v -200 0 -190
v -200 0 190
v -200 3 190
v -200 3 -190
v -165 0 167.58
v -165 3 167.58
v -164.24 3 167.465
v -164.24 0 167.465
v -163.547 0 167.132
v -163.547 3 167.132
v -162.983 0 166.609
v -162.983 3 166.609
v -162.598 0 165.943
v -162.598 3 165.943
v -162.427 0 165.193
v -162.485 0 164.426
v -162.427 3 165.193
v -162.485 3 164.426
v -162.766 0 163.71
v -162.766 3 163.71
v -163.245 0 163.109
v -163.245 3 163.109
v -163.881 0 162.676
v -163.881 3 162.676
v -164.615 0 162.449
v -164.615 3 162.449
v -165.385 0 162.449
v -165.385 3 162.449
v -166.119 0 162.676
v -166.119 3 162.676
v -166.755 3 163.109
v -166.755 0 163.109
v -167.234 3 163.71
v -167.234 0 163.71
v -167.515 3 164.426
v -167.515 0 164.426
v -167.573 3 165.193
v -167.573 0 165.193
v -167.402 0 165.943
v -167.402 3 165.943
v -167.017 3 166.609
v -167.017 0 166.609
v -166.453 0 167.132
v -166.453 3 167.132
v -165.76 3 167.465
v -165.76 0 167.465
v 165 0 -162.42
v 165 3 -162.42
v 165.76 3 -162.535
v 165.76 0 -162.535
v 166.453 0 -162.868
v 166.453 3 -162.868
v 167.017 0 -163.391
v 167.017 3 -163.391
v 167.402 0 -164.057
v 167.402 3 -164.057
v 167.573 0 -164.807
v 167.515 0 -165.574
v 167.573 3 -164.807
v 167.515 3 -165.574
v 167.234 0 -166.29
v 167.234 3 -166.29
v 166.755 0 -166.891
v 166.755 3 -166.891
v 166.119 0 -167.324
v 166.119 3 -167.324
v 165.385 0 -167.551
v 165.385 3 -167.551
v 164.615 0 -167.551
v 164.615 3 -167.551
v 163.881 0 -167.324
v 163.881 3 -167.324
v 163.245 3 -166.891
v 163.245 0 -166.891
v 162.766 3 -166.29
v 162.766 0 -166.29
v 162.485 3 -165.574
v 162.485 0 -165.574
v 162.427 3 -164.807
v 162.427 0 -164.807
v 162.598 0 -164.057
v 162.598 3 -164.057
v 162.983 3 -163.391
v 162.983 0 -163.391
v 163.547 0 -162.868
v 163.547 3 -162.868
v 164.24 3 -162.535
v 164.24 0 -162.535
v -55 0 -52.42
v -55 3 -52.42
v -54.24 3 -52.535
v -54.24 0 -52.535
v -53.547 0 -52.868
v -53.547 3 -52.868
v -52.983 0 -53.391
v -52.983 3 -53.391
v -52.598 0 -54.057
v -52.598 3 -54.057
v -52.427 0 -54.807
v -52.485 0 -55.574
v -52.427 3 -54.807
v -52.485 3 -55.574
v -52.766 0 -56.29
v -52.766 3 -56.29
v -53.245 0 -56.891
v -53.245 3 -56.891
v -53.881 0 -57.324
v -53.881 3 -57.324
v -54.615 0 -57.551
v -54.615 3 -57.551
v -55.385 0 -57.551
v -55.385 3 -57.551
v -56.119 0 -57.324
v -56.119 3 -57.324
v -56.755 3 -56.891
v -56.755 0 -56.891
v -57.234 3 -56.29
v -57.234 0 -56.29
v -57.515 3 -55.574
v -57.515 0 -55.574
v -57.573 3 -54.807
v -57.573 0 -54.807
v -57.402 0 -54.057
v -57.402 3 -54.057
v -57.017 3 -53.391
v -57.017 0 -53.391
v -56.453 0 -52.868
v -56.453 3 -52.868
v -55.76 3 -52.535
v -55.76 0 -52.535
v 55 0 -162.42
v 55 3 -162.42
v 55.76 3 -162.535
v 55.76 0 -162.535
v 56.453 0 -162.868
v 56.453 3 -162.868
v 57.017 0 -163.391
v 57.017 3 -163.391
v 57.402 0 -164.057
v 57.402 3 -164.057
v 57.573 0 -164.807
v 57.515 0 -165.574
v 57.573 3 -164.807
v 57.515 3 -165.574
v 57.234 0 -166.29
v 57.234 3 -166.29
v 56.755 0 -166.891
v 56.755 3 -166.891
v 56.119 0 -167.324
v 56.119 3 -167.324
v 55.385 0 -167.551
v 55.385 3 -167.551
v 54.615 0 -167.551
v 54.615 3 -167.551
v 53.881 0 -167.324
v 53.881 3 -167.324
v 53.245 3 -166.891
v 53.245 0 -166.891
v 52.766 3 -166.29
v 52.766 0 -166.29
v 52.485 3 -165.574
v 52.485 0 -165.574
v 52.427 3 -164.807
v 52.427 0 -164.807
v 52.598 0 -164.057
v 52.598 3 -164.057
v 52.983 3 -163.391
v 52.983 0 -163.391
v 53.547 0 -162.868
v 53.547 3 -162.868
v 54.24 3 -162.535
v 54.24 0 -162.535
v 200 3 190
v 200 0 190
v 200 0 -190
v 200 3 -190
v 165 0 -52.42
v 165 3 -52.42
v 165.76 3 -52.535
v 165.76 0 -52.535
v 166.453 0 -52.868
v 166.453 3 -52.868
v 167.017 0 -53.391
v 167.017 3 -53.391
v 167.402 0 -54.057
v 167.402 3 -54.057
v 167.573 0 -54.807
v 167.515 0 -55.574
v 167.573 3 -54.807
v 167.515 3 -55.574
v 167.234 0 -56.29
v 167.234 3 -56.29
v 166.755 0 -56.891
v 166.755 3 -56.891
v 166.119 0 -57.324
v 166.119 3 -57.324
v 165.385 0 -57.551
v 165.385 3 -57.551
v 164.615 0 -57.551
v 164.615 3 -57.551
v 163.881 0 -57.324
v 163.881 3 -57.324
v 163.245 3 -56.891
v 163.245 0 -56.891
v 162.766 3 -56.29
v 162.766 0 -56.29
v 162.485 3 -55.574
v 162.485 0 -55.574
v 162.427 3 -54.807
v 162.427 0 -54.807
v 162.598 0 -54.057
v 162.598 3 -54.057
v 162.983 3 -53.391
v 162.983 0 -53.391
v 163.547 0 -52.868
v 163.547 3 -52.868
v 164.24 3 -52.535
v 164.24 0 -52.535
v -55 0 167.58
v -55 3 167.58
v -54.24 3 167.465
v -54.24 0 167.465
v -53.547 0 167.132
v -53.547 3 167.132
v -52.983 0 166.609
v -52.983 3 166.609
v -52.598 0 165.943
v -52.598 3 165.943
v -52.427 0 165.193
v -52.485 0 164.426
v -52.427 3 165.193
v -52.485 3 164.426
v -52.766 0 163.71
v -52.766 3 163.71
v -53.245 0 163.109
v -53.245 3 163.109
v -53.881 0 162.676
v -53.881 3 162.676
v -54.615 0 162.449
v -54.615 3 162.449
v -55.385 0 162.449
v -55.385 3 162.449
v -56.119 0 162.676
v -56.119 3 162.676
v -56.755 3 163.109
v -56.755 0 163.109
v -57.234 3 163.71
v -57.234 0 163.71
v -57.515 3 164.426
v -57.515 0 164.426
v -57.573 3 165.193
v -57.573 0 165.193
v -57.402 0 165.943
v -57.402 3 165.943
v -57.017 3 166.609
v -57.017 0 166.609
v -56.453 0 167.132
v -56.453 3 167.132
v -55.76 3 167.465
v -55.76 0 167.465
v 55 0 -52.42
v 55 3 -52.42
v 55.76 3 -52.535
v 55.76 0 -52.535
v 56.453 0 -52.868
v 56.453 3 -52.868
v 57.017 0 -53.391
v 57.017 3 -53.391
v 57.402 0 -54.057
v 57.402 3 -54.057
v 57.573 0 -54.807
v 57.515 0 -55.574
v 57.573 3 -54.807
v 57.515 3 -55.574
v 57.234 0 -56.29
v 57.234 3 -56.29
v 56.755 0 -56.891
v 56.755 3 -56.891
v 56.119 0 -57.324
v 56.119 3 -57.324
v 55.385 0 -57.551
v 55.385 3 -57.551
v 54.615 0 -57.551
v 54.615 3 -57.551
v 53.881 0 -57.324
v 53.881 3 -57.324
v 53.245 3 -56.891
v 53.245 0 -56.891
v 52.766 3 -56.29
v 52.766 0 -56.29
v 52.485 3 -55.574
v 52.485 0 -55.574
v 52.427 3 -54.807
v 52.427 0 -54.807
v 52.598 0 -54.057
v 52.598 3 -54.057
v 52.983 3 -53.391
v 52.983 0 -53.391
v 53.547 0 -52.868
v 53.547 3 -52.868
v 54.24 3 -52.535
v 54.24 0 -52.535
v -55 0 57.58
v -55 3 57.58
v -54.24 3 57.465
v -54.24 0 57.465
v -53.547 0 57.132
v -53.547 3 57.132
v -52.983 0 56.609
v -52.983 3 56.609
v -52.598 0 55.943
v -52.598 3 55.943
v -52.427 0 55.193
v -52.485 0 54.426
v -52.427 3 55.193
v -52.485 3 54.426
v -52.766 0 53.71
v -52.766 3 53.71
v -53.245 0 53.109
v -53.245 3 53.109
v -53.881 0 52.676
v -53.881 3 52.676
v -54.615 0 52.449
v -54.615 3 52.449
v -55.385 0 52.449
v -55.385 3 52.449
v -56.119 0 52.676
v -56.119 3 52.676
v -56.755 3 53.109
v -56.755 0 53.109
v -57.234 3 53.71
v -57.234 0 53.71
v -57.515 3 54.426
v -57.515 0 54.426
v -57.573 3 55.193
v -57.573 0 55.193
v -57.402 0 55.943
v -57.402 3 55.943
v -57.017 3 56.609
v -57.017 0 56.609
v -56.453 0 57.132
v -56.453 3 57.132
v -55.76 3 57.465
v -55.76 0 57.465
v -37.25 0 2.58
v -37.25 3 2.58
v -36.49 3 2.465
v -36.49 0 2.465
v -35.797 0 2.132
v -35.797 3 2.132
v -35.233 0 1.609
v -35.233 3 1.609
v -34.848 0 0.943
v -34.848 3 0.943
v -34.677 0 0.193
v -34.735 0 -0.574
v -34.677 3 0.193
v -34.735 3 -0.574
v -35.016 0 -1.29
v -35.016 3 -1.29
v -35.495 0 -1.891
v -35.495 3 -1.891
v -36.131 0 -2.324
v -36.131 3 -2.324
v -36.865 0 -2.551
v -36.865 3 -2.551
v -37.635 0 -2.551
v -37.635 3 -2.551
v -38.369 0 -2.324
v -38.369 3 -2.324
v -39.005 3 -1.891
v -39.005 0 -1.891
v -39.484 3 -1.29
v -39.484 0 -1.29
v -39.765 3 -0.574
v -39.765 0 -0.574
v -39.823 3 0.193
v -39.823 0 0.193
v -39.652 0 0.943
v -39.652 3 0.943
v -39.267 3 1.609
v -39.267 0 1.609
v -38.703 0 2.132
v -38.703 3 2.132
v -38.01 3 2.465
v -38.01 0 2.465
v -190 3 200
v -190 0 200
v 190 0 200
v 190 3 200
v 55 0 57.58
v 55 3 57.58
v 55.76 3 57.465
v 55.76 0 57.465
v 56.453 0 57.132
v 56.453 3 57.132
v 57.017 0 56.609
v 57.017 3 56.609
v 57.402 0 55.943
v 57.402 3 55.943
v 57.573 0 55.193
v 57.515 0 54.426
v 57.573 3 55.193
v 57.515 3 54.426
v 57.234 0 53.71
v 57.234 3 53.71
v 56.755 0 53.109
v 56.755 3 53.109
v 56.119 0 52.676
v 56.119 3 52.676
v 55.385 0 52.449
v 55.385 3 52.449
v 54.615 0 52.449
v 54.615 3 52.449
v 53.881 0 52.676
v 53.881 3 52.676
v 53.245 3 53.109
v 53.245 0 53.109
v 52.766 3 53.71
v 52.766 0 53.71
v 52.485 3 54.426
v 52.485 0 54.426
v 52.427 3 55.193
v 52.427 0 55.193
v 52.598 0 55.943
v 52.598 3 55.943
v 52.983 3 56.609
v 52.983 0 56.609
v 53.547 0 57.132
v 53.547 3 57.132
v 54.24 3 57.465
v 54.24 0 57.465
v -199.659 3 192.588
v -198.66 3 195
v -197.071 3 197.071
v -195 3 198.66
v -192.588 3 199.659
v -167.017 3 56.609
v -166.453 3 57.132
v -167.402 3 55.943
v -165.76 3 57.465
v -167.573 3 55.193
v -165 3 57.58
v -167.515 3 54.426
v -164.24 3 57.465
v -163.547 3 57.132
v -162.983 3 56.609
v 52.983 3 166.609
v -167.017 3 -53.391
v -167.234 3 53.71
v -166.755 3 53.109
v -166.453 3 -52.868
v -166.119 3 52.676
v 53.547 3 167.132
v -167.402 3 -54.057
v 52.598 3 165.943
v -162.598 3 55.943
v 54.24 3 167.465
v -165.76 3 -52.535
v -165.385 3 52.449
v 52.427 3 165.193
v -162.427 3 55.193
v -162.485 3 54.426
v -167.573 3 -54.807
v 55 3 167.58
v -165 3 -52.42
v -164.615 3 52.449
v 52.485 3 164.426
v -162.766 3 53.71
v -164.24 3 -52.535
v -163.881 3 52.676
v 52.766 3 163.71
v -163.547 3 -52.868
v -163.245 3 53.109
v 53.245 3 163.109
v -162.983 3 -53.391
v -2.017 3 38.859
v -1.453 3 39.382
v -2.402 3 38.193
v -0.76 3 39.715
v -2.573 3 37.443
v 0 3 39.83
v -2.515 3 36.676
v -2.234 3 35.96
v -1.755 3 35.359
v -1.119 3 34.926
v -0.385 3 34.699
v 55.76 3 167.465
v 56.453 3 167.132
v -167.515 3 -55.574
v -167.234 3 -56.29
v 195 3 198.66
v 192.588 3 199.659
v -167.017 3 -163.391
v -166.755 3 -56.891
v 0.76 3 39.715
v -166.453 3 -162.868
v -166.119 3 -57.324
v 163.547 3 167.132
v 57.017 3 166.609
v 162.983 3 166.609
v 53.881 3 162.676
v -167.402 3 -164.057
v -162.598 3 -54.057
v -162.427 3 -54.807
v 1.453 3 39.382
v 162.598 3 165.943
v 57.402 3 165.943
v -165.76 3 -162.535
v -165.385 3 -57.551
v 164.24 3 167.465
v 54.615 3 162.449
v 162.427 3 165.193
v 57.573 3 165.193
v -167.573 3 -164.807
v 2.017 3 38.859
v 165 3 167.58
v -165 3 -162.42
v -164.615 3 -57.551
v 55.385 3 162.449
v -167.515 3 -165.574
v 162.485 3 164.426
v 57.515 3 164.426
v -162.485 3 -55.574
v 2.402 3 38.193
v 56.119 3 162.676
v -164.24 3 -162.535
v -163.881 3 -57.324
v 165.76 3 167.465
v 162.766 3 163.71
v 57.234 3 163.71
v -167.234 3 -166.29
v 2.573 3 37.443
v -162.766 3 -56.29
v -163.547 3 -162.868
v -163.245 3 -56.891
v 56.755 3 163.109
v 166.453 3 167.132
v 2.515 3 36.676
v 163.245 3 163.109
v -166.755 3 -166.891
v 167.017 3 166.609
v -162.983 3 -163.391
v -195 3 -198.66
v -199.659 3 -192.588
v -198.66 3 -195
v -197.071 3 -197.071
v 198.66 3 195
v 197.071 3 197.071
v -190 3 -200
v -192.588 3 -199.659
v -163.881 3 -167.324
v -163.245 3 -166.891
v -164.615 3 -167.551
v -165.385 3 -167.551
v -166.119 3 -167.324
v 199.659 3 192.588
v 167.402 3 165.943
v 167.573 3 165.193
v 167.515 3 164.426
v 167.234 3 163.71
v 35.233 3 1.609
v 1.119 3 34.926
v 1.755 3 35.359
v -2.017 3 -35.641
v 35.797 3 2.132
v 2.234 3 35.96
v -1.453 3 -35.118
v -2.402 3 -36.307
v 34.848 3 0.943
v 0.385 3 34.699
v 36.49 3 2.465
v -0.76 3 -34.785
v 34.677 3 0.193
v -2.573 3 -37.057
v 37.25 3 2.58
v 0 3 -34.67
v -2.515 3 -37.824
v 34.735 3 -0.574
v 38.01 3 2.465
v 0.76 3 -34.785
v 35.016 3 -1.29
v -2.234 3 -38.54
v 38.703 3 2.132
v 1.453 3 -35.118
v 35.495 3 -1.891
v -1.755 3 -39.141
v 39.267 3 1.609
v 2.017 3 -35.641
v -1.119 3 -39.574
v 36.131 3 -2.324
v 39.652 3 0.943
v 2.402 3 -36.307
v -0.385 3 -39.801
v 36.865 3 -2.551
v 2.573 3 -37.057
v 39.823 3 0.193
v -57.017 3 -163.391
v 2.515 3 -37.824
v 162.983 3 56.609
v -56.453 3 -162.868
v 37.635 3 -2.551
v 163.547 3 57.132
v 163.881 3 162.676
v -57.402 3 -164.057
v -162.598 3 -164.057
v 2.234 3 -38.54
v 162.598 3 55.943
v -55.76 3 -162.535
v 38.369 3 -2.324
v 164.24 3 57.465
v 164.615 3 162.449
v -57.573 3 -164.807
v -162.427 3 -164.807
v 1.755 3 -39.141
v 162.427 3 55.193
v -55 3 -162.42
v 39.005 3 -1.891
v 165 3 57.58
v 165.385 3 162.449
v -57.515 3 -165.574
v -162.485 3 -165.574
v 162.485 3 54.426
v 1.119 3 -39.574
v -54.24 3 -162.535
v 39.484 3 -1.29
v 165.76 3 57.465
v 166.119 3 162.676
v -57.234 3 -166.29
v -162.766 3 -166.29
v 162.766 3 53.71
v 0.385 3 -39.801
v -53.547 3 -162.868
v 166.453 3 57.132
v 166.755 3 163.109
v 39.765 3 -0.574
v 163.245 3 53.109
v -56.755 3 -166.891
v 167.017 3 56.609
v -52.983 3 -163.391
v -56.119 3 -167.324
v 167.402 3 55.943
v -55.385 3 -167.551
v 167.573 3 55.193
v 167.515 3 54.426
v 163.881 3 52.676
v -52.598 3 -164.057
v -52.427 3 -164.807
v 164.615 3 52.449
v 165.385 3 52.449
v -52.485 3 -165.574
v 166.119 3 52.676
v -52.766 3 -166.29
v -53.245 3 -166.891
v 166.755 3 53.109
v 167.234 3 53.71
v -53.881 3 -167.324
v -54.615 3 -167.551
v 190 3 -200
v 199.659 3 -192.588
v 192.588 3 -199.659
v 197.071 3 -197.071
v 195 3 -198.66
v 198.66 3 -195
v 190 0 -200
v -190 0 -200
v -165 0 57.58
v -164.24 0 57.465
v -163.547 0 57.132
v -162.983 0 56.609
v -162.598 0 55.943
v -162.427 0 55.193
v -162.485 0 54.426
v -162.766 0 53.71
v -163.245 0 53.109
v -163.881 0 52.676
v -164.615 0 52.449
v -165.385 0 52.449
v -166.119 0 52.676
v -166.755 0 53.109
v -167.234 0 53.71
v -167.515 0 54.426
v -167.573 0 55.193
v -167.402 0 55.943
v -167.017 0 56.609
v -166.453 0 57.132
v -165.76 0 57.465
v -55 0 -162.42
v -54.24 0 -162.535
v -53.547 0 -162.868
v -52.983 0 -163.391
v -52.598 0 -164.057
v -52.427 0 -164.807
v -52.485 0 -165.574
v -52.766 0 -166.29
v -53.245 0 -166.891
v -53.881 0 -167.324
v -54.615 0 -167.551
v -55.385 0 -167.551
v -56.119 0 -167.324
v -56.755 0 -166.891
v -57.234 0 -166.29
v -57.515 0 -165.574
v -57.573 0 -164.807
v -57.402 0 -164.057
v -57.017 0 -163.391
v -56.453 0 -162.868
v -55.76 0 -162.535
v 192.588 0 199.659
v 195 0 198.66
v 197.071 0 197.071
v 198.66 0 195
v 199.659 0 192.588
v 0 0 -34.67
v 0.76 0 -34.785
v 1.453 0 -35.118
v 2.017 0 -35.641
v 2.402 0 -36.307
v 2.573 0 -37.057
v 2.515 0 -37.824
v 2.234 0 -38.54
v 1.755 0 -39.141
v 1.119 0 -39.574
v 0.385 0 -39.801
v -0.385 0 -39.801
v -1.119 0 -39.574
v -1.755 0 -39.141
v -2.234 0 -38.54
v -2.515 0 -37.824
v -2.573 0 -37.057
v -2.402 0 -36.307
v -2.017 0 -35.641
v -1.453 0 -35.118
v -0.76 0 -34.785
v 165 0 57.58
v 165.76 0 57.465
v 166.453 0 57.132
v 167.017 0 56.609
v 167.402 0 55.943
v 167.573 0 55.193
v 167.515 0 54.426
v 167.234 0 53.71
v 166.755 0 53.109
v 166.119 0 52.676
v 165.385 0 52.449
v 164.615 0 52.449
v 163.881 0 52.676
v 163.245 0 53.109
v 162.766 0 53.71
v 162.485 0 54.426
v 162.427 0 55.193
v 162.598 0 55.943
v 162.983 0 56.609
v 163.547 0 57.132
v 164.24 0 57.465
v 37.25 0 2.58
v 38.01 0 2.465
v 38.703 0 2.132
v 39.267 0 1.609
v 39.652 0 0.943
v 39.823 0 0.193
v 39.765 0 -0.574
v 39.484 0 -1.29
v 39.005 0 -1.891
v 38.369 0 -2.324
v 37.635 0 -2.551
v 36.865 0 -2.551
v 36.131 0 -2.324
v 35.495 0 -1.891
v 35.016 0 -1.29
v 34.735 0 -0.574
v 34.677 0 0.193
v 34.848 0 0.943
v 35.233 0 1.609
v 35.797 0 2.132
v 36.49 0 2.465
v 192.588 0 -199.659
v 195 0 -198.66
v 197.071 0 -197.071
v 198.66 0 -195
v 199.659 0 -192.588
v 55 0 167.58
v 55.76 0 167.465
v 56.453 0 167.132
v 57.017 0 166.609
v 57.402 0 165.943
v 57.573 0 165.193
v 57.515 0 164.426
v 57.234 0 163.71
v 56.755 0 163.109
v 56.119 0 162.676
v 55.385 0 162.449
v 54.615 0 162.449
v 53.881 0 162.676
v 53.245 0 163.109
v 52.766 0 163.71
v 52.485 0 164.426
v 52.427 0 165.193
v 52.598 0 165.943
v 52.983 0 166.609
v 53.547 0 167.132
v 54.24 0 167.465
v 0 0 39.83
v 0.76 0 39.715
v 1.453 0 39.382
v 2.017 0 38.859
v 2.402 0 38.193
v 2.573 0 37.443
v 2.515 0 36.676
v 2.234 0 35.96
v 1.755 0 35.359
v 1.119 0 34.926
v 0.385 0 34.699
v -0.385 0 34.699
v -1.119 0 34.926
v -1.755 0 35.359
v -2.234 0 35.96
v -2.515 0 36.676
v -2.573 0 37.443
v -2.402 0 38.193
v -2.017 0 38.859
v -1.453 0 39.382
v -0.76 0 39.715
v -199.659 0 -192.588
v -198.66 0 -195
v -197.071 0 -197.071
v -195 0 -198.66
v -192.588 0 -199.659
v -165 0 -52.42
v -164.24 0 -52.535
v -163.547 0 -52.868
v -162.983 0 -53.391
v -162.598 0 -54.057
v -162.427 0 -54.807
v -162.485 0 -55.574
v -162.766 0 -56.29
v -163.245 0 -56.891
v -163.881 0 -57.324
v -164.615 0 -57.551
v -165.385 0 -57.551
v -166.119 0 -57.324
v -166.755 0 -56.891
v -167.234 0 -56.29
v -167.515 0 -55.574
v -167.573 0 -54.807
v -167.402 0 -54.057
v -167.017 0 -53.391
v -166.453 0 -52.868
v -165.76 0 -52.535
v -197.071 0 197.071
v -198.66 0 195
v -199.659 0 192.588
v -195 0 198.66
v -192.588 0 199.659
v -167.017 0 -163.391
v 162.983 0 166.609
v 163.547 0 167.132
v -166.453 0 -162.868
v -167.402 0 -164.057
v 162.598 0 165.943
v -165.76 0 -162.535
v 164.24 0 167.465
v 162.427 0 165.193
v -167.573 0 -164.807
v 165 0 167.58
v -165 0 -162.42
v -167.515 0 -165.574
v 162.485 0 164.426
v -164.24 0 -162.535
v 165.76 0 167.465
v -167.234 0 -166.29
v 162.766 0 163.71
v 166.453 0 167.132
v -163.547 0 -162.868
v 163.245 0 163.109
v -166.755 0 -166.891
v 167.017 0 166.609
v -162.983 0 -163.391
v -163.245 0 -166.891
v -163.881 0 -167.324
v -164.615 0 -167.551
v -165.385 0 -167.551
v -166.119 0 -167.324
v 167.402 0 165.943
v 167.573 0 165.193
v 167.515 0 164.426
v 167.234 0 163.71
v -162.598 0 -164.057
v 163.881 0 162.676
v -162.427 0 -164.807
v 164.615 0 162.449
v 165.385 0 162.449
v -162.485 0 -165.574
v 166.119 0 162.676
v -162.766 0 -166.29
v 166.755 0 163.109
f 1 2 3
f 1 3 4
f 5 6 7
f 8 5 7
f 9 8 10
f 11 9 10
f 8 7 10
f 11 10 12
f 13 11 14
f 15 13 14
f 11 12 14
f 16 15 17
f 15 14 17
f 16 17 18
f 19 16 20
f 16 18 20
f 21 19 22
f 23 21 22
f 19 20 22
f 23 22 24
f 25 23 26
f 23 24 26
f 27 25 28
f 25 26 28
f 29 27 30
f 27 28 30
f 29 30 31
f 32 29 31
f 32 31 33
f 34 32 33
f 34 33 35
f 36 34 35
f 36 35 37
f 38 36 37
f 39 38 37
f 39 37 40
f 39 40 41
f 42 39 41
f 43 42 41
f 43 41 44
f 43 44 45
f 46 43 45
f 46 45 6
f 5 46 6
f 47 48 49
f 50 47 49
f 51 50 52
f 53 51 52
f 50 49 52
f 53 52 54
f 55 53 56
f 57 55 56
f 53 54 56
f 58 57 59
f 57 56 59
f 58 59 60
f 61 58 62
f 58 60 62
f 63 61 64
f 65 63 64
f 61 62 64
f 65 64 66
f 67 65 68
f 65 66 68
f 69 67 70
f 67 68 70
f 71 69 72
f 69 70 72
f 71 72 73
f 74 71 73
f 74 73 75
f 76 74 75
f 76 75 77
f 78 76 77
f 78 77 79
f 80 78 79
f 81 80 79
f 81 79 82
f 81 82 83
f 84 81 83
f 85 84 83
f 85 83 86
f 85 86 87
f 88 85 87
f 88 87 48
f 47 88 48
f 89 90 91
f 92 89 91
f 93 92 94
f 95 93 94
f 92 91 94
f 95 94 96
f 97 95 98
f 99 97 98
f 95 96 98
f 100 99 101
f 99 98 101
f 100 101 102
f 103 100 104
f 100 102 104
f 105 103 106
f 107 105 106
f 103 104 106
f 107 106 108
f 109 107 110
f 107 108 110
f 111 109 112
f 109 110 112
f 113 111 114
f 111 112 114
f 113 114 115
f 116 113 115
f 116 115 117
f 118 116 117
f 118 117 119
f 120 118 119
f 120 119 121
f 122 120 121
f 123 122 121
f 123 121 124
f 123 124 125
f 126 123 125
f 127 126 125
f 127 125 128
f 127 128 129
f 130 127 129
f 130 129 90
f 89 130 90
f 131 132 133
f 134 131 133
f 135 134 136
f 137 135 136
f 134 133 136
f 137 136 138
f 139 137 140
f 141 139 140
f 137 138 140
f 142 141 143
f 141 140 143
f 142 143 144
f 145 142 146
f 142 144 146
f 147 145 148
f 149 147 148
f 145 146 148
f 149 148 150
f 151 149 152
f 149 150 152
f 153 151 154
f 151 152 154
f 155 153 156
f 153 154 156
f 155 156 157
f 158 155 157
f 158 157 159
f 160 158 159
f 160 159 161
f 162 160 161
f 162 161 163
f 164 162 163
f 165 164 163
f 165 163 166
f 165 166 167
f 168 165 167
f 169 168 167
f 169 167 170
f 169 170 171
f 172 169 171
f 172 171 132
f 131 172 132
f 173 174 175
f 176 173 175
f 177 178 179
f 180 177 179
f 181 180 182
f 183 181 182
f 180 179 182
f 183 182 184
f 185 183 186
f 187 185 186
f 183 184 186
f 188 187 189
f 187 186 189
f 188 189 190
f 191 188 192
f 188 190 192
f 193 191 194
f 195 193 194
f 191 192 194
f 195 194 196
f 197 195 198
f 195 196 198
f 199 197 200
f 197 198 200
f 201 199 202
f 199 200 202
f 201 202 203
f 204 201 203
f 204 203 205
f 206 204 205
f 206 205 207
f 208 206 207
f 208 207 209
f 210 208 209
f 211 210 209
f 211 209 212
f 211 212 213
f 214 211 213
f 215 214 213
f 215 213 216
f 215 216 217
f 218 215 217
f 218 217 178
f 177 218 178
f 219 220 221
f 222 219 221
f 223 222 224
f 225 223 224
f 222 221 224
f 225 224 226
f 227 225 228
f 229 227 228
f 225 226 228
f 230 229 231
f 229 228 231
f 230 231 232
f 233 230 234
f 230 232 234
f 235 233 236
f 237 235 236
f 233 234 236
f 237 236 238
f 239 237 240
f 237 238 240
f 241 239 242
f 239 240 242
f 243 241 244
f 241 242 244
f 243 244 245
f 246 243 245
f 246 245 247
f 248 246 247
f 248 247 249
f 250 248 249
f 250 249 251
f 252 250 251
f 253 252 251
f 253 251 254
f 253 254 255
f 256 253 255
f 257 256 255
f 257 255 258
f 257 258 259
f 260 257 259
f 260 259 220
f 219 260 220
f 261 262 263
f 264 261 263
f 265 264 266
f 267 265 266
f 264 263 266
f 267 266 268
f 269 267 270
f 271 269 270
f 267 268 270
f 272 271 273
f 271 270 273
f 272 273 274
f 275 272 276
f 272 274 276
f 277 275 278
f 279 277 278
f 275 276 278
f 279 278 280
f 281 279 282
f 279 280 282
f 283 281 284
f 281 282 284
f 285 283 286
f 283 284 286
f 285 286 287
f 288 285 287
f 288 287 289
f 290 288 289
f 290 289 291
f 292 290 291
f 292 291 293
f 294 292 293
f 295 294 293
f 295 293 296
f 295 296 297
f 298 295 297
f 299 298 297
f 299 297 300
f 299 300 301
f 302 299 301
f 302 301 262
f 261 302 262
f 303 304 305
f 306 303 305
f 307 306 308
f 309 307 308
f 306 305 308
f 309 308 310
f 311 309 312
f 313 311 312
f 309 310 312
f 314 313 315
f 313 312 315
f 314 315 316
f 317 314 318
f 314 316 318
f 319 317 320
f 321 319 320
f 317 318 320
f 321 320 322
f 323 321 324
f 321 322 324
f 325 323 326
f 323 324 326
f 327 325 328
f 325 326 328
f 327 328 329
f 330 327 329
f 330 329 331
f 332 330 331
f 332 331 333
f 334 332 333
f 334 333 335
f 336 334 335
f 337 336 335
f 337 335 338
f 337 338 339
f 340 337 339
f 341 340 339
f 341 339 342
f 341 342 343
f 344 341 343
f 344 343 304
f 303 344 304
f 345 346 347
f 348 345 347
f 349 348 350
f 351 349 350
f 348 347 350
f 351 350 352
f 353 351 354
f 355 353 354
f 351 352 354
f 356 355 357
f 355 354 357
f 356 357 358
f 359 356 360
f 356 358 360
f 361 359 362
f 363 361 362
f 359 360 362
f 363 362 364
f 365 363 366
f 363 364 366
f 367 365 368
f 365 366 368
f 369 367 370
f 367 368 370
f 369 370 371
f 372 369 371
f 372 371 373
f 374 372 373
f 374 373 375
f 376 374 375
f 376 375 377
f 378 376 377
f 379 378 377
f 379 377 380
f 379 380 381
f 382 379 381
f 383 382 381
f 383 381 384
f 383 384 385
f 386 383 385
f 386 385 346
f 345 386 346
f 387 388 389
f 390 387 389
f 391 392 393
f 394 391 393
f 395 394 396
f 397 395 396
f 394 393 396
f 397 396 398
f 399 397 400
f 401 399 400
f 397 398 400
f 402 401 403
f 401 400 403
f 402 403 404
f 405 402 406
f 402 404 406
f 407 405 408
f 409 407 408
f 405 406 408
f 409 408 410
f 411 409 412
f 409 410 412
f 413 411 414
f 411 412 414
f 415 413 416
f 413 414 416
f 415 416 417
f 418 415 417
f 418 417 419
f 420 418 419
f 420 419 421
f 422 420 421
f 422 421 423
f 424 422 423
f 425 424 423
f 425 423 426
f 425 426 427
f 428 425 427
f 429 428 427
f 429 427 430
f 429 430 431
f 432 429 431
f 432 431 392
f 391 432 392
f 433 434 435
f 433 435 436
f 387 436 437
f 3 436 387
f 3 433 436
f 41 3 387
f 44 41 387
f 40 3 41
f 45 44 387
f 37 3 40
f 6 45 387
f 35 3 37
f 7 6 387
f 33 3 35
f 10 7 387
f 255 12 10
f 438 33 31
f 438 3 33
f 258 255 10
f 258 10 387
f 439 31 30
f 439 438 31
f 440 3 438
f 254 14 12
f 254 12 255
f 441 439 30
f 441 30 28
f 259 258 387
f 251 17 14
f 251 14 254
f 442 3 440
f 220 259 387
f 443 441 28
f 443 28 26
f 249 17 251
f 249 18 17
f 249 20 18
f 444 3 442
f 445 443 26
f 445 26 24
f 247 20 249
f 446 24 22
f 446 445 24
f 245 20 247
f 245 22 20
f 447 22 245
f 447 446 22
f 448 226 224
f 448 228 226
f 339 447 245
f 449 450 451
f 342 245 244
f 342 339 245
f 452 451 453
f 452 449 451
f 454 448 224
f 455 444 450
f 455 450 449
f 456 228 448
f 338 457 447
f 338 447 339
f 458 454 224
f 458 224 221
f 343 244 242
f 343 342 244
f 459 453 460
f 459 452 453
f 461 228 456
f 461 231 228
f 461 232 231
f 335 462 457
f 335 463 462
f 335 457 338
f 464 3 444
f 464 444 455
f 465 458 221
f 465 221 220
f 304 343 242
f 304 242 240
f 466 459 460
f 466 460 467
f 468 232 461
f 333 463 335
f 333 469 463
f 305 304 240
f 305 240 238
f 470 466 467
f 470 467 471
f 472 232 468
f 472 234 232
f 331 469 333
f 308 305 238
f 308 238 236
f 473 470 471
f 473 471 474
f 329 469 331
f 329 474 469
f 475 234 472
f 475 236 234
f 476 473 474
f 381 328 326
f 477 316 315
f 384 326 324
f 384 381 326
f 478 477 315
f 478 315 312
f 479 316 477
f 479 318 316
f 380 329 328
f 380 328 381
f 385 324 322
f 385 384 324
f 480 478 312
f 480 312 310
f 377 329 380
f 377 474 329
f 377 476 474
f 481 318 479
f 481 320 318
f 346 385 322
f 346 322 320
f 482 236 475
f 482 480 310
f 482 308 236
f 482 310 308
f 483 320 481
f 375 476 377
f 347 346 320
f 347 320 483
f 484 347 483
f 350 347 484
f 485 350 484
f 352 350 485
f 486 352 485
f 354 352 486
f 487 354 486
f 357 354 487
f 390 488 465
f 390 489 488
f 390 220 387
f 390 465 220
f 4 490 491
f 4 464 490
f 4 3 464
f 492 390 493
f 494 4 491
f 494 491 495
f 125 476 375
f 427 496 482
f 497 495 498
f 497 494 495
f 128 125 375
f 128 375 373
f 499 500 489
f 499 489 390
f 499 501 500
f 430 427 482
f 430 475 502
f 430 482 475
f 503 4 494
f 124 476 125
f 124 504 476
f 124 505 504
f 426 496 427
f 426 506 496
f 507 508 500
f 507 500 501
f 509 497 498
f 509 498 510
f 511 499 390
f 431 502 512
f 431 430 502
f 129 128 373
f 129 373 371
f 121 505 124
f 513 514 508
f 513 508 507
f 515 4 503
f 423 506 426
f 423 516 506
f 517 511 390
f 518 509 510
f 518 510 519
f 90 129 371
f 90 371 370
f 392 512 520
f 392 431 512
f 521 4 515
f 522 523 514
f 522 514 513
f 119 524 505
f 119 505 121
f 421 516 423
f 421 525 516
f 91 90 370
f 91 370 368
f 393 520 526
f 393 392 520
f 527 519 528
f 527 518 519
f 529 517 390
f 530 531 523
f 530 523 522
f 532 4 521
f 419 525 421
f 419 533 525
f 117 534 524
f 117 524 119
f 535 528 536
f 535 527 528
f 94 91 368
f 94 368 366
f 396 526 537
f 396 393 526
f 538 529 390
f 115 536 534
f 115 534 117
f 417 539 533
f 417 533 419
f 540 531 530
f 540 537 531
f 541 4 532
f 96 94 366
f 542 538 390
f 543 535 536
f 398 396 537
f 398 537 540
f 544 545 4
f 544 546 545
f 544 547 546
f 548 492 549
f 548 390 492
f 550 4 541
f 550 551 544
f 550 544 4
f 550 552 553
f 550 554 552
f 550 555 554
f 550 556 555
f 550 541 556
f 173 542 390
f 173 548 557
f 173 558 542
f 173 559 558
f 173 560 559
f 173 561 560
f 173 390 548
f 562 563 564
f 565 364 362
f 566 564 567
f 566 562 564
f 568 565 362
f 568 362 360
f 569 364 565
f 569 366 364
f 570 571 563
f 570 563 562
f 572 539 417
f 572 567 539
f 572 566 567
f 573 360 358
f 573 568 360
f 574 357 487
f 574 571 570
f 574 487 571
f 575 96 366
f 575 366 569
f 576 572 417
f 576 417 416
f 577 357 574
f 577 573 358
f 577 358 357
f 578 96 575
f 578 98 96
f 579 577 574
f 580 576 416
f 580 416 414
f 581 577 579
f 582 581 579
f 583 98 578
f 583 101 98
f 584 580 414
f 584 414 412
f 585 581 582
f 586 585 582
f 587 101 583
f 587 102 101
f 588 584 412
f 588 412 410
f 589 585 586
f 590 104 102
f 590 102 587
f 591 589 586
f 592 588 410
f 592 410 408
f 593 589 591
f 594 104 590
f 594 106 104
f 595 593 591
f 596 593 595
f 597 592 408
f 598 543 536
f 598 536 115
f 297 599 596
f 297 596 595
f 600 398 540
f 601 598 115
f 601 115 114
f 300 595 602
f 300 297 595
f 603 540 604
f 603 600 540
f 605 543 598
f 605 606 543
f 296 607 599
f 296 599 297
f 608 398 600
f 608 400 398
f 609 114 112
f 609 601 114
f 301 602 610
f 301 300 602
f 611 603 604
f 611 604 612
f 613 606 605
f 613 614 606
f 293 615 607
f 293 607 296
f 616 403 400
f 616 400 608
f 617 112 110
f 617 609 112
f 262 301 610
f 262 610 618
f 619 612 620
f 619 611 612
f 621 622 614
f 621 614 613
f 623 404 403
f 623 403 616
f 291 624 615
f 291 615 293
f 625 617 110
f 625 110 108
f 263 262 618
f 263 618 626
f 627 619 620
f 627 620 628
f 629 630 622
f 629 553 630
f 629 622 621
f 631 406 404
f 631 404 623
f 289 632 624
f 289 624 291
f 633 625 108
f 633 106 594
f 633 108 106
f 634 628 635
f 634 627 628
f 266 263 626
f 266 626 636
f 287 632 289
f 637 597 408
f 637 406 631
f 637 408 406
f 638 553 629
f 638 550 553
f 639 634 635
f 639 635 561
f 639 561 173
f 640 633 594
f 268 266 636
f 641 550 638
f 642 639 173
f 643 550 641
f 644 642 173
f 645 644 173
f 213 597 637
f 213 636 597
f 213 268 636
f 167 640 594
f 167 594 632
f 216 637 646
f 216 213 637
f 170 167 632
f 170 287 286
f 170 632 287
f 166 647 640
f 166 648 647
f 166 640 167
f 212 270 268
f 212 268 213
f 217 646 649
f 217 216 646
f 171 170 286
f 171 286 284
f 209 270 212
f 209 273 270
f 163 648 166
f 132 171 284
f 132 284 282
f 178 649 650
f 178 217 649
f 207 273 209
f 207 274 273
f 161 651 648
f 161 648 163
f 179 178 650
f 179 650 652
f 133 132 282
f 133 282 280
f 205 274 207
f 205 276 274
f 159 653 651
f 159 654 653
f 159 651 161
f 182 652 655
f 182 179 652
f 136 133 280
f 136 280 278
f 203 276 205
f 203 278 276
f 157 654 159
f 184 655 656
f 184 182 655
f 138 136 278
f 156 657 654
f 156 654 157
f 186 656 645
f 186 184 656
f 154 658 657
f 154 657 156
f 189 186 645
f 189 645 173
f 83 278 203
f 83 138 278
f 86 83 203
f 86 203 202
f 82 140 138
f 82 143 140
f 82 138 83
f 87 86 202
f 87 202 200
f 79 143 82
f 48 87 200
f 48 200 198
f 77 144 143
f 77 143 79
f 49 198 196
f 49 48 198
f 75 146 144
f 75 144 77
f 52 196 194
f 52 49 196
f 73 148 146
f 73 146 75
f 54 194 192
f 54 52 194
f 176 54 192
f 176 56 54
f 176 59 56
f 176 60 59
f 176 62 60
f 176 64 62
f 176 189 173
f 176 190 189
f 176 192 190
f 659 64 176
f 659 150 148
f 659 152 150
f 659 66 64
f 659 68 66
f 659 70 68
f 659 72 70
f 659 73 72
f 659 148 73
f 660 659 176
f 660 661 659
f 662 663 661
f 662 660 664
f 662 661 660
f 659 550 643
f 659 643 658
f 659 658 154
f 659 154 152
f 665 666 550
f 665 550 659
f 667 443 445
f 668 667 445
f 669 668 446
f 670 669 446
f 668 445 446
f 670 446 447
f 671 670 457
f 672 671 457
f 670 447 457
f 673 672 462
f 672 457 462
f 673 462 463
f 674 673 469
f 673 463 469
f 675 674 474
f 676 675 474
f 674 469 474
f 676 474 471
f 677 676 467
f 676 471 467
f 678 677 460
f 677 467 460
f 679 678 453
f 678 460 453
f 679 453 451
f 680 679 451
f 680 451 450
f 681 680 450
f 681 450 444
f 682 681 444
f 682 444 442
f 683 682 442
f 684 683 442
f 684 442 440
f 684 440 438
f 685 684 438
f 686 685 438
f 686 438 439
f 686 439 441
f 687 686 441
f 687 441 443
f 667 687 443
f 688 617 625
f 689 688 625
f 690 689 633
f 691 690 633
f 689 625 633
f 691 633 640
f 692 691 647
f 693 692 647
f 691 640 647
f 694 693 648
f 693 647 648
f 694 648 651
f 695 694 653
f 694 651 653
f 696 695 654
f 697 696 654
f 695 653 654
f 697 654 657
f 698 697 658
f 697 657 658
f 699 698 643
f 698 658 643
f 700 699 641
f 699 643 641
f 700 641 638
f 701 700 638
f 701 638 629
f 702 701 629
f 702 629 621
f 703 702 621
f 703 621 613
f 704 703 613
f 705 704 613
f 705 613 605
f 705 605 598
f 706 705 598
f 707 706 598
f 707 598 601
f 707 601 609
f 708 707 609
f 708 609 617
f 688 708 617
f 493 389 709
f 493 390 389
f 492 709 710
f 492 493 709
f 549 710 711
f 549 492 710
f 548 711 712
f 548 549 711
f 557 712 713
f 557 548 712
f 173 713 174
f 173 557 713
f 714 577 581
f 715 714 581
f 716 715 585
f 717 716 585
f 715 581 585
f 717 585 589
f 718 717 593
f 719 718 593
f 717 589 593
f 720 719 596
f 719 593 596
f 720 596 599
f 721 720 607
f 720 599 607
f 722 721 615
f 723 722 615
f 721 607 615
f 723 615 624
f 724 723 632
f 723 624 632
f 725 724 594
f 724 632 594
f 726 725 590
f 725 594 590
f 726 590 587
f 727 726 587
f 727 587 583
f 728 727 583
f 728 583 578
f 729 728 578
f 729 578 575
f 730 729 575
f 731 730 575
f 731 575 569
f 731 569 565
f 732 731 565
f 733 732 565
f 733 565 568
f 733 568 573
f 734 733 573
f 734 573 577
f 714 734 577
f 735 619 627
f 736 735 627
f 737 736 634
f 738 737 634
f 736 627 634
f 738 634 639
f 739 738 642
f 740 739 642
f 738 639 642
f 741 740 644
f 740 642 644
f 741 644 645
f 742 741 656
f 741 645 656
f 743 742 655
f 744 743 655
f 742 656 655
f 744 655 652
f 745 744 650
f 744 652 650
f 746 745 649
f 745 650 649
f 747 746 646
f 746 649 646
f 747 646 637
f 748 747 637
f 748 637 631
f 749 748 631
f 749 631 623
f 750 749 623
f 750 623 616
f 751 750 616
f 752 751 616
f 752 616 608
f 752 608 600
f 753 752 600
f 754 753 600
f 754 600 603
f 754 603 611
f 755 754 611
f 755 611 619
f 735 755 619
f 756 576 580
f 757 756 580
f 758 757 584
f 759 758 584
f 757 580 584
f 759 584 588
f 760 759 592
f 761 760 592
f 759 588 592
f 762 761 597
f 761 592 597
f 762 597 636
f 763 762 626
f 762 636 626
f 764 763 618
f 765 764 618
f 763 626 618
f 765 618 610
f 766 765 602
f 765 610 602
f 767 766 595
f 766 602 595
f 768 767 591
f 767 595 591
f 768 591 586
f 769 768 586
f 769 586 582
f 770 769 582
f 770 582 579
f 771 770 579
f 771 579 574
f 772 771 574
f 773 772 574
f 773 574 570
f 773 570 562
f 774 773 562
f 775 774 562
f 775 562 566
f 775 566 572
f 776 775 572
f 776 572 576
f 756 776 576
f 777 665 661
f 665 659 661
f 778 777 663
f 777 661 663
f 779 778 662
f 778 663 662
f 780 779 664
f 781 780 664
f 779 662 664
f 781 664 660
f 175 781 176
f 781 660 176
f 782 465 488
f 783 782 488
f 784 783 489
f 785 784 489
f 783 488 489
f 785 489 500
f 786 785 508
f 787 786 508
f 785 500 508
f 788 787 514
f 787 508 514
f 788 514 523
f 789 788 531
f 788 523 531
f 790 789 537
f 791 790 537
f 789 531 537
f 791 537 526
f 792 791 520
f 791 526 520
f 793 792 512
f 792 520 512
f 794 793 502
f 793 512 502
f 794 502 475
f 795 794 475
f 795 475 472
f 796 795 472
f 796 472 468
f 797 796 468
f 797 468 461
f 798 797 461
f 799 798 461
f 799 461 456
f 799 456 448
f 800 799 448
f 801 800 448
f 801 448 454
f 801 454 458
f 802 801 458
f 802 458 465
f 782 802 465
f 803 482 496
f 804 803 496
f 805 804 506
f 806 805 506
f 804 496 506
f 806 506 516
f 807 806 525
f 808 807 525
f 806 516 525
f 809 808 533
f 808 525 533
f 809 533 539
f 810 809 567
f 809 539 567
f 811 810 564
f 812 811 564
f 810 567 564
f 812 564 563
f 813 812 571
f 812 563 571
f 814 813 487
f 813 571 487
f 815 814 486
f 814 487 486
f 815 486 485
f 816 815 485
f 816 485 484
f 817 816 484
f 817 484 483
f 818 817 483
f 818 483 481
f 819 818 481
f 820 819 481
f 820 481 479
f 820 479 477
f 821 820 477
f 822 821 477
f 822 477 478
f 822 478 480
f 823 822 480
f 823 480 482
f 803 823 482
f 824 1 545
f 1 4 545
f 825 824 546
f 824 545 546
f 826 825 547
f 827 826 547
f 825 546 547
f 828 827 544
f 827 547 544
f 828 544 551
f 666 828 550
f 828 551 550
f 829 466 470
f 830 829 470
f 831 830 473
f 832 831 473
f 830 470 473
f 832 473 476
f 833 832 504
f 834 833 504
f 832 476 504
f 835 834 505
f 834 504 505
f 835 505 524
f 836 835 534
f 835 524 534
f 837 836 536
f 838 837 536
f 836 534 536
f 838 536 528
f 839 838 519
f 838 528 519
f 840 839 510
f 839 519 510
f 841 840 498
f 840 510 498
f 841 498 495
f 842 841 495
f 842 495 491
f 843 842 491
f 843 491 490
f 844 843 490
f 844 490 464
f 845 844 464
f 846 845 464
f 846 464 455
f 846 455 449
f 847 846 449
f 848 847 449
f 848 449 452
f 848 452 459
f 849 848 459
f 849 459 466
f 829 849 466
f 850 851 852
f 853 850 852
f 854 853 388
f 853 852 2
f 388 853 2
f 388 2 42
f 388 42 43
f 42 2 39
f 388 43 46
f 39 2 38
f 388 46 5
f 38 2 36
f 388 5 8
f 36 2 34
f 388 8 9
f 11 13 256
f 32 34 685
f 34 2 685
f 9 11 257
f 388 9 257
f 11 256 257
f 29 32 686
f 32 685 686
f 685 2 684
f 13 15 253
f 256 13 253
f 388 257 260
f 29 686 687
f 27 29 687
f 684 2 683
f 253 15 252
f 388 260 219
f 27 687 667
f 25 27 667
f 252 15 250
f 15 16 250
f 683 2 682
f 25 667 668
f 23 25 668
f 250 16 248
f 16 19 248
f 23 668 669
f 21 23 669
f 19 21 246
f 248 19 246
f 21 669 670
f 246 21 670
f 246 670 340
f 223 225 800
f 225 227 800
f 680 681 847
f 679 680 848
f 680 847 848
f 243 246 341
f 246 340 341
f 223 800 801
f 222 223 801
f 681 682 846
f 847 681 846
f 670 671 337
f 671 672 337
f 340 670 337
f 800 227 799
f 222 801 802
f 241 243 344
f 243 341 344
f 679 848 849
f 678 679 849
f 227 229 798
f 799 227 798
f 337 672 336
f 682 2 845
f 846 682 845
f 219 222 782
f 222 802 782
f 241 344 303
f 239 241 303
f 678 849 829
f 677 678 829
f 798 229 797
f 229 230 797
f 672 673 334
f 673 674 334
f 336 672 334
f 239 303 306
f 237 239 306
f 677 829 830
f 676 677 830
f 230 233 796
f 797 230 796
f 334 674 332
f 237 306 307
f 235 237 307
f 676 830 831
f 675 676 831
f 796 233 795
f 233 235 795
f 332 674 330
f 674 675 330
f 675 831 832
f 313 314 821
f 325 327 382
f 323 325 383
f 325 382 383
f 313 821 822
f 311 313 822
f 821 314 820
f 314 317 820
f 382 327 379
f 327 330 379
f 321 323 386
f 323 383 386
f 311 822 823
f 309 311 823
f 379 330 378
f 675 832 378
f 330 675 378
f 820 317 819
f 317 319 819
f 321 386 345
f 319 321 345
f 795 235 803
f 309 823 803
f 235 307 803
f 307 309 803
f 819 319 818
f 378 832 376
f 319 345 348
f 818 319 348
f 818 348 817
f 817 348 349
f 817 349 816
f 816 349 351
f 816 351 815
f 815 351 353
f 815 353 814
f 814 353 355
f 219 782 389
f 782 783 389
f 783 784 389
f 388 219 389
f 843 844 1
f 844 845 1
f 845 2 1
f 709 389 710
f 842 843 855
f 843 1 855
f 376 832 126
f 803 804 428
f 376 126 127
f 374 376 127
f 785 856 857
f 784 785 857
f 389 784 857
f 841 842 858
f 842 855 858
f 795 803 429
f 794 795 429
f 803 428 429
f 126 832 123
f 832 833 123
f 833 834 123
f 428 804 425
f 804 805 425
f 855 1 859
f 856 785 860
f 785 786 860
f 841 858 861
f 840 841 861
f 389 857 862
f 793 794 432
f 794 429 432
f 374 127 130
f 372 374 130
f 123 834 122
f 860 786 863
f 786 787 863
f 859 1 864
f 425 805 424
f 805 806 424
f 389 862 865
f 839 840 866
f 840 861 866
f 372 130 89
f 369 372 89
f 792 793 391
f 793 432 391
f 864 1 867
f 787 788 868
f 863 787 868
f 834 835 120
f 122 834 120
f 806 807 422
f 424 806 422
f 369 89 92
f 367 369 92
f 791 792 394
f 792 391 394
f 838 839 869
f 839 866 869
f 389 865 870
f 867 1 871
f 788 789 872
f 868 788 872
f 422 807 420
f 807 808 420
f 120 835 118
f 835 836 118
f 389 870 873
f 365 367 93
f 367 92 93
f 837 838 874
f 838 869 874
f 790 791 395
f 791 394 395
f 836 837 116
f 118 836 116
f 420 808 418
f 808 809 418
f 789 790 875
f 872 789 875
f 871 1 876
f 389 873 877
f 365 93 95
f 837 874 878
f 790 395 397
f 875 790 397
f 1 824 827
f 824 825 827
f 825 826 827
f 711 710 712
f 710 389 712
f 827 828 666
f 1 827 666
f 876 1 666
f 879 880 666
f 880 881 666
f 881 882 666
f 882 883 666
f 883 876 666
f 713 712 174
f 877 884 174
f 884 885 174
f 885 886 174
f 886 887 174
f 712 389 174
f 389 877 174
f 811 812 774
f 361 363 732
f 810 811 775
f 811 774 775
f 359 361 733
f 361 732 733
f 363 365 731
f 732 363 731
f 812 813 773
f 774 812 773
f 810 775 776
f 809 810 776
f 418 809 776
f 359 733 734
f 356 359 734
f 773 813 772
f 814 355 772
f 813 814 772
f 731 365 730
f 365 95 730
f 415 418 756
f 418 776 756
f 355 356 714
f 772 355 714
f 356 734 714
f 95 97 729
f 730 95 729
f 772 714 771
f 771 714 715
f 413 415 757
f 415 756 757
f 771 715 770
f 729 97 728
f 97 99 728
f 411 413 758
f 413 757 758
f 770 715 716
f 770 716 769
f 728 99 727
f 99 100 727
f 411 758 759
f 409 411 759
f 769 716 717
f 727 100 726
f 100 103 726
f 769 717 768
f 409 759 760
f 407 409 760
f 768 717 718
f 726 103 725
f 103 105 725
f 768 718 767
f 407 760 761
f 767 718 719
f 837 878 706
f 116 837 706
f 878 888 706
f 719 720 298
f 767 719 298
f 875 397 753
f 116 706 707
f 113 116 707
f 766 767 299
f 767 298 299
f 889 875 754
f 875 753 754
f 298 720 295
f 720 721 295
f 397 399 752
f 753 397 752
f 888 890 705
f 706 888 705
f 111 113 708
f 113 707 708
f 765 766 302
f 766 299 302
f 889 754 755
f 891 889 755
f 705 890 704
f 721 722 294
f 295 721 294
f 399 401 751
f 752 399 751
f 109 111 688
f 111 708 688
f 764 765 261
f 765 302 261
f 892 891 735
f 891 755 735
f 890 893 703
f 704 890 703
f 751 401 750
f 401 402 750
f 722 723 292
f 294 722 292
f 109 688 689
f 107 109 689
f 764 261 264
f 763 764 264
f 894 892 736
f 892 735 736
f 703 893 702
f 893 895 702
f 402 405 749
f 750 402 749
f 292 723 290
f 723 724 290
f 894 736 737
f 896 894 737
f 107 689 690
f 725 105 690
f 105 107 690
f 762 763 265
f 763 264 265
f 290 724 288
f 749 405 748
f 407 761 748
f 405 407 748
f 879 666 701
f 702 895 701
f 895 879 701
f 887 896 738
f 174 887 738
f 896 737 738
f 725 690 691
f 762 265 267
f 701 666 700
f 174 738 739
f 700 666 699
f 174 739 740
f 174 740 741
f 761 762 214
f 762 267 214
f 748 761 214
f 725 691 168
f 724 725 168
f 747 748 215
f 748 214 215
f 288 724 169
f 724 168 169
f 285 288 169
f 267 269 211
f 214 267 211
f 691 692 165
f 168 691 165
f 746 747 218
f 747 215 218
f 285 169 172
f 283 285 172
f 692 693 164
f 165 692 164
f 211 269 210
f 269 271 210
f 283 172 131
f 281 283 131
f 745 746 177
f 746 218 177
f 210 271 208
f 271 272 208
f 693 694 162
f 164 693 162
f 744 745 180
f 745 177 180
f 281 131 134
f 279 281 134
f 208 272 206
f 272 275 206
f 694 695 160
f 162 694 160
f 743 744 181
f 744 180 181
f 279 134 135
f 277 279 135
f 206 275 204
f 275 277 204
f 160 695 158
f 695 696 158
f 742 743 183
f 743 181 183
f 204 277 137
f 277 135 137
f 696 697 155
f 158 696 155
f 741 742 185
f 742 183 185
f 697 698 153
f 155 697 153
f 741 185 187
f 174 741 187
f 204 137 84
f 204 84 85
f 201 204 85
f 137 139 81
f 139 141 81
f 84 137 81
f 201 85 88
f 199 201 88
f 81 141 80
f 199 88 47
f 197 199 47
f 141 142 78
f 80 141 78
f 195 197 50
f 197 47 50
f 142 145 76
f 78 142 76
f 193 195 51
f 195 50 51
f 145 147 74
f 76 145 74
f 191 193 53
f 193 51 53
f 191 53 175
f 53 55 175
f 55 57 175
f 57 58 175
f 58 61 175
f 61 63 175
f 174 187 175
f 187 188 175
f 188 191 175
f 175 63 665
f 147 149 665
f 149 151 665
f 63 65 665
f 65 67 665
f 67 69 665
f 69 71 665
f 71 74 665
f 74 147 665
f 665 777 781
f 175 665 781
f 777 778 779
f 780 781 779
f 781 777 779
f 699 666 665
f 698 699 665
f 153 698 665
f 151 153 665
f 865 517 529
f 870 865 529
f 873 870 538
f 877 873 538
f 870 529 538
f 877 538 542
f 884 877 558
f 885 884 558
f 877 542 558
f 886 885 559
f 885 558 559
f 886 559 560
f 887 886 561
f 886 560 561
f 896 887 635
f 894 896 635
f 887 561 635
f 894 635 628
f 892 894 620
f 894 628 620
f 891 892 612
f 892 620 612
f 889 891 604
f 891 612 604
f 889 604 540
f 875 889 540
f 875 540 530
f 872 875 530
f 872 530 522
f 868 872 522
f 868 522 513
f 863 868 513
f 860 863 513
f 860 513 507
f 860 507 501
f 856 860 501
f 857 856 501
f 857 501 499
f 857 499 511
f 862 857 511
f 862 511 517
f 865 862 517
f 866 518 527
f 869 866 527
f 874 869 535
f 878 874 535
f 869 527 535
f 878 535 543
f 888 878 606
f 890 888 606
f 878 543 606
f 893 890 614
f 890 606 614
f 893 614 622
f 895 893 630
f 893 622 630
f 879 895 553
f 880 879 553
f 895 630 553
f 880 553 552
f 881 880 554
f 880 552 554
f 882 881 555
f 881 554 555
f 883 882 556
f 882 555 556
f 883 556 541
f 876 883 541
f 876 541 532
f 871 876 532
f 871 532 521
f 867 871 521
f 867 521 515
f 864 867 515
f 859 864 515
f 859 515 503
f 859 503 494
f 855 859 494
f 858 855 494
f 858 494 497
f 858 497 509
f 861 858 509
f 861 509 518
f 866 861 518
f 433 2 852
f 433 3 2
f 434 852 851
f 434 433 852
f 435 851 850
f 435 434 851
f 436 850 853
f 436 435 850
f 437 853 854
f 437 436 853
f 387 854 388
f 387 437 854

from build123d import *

# Parameters (mm, degrees)
SKETCH1_W           = 400
SKETCH1_H           = 400
BOSS_EXTRUDE1_DEPTH = 3
SKETCH3_R           = 2.58
CUT_EXTRUDE1_DEPTH  = 283.85862193
SKETCH4_R           = 2.58
CUT_EXTRUDE2_DEPTH  = 283.85862193
FILLET1_R           = 10


with BuildPart() as part:
    # Sketch1 → Boss-Extrude1 (new body)
    with BuildSketch(Plane(origin=(0, 0, 0), x_dir=(1, 0, 0), z_dir=(0, 1, 0))):
        Rectangle(SKETCH1_W, SKETCH1_H)
    extrude(amount=BOSS_EXTRUDE1_DEPTH)

    # Sketch3 → Cut-Extrude1 (cut, through all)
    with BuildSketch(Plane(origin=(0, 3, 0), x_dir=(1, 0, 0), z_dir=(0, 1, 0))):
        with Locations(Location((-37.25, 0, 0), (0, 0, 270))):
            Circle(SKETCH3_R)
        with Locations(Location((0, 37.25, 0), (0, 0, 270))):
            Circle(SKETCH3_R)
        with Locations(Location((37.25, 0, 0), (0, 0, 270))):
            Circle(SKETCH3_R)
        with Locations(Location((0, -37.25, 0), (0, 0, 270))):
            Circle(SKETCH3_R)
    extrude(amount=-CUT_EXTRUDE1_DEPTH, mode=Mode.SUBTRACT)

    # Sketch4 → Cut-Extrude2 (cut, through all)
    with BuildSketch(Plane(origin=(0, 3, 0), x_dir=(1, 0, 0), z_dir=(0, 1, 0))):
        with Locations(Location((-165, 165, 0), (0, 0, 270))):
            Circle(SKETCH4_R)
        with Locations(Location((-55, 165, 0), (0, 0, 270))):
            Circle(SKETCH4_R)
        with Locations(Location((55, 165, 0), (0, 0, 270))):
            Circle(SKETCH4_R)
        with Locations(Location((165, 165, 0), (0, 0, 270))):
            Circle(SKETCH4_R)
        with Locations(Location((-55, 55, 0), (0, 0, 270))):
            Circle(SKETCH4_R)
        with Locations(Location((55, 55, 0), (0, 0, 270))):
            Circle(SKETCH4_R)
        with Locations(Location((165, 55, 0), (0, 0, 270))):
            Circle(SKETCH4_R)
        with Locations(Location((-55, -55, 0), (0, 0, 270))):
            Circle(SKETCH4_R)
        with Locations(Location((55, -55, 0), (0, 0, 270))):
            Circle(SKETCH4_R)
        with Locations(Location((165, -55, 0), (0, 0, 270))):
            Circle(SKETCH4_R)
        with Locations(Location((-55, -165, 0), (0, 0, 270))):
            Circle(SKETCH4_R)
        with Locations(Location((55, -165, 0), (0, 0, 270))):
            Circle(SKETCH4_R)
        with Locations(Location((165, -165, 0), (0, 0, 270))):
            Circle(SKETCH4_R)
        with Locations(Location((-165, 55, 0), (0, 0, 270))):
            Circle(SKETCH4_R)
        with Locations(Location((-165, -55, 0), (0, 0, 270))):
            Circle(SKETCH4_R)
        with Locations(Location((-165, -165, 0), (0, 0, 270))):
            Circle(SKETCH4_R)
    extrude(amount=-CUT_EXTRUDE2_DEPTH, mode=Mode.SUBTRACT)

    # Fillet1
    fillet1_edges = [part.edges().sort_by_distance(p)[0] for p in [
        (200, 1.5, 200),
        (-200, 1.5, 200),
        (-200, 1.5, -200),
        (200, 1.5, -200),
    ]]
    fillet(fillet1_edges, radius=FILLET1_R)


solid = part.part
